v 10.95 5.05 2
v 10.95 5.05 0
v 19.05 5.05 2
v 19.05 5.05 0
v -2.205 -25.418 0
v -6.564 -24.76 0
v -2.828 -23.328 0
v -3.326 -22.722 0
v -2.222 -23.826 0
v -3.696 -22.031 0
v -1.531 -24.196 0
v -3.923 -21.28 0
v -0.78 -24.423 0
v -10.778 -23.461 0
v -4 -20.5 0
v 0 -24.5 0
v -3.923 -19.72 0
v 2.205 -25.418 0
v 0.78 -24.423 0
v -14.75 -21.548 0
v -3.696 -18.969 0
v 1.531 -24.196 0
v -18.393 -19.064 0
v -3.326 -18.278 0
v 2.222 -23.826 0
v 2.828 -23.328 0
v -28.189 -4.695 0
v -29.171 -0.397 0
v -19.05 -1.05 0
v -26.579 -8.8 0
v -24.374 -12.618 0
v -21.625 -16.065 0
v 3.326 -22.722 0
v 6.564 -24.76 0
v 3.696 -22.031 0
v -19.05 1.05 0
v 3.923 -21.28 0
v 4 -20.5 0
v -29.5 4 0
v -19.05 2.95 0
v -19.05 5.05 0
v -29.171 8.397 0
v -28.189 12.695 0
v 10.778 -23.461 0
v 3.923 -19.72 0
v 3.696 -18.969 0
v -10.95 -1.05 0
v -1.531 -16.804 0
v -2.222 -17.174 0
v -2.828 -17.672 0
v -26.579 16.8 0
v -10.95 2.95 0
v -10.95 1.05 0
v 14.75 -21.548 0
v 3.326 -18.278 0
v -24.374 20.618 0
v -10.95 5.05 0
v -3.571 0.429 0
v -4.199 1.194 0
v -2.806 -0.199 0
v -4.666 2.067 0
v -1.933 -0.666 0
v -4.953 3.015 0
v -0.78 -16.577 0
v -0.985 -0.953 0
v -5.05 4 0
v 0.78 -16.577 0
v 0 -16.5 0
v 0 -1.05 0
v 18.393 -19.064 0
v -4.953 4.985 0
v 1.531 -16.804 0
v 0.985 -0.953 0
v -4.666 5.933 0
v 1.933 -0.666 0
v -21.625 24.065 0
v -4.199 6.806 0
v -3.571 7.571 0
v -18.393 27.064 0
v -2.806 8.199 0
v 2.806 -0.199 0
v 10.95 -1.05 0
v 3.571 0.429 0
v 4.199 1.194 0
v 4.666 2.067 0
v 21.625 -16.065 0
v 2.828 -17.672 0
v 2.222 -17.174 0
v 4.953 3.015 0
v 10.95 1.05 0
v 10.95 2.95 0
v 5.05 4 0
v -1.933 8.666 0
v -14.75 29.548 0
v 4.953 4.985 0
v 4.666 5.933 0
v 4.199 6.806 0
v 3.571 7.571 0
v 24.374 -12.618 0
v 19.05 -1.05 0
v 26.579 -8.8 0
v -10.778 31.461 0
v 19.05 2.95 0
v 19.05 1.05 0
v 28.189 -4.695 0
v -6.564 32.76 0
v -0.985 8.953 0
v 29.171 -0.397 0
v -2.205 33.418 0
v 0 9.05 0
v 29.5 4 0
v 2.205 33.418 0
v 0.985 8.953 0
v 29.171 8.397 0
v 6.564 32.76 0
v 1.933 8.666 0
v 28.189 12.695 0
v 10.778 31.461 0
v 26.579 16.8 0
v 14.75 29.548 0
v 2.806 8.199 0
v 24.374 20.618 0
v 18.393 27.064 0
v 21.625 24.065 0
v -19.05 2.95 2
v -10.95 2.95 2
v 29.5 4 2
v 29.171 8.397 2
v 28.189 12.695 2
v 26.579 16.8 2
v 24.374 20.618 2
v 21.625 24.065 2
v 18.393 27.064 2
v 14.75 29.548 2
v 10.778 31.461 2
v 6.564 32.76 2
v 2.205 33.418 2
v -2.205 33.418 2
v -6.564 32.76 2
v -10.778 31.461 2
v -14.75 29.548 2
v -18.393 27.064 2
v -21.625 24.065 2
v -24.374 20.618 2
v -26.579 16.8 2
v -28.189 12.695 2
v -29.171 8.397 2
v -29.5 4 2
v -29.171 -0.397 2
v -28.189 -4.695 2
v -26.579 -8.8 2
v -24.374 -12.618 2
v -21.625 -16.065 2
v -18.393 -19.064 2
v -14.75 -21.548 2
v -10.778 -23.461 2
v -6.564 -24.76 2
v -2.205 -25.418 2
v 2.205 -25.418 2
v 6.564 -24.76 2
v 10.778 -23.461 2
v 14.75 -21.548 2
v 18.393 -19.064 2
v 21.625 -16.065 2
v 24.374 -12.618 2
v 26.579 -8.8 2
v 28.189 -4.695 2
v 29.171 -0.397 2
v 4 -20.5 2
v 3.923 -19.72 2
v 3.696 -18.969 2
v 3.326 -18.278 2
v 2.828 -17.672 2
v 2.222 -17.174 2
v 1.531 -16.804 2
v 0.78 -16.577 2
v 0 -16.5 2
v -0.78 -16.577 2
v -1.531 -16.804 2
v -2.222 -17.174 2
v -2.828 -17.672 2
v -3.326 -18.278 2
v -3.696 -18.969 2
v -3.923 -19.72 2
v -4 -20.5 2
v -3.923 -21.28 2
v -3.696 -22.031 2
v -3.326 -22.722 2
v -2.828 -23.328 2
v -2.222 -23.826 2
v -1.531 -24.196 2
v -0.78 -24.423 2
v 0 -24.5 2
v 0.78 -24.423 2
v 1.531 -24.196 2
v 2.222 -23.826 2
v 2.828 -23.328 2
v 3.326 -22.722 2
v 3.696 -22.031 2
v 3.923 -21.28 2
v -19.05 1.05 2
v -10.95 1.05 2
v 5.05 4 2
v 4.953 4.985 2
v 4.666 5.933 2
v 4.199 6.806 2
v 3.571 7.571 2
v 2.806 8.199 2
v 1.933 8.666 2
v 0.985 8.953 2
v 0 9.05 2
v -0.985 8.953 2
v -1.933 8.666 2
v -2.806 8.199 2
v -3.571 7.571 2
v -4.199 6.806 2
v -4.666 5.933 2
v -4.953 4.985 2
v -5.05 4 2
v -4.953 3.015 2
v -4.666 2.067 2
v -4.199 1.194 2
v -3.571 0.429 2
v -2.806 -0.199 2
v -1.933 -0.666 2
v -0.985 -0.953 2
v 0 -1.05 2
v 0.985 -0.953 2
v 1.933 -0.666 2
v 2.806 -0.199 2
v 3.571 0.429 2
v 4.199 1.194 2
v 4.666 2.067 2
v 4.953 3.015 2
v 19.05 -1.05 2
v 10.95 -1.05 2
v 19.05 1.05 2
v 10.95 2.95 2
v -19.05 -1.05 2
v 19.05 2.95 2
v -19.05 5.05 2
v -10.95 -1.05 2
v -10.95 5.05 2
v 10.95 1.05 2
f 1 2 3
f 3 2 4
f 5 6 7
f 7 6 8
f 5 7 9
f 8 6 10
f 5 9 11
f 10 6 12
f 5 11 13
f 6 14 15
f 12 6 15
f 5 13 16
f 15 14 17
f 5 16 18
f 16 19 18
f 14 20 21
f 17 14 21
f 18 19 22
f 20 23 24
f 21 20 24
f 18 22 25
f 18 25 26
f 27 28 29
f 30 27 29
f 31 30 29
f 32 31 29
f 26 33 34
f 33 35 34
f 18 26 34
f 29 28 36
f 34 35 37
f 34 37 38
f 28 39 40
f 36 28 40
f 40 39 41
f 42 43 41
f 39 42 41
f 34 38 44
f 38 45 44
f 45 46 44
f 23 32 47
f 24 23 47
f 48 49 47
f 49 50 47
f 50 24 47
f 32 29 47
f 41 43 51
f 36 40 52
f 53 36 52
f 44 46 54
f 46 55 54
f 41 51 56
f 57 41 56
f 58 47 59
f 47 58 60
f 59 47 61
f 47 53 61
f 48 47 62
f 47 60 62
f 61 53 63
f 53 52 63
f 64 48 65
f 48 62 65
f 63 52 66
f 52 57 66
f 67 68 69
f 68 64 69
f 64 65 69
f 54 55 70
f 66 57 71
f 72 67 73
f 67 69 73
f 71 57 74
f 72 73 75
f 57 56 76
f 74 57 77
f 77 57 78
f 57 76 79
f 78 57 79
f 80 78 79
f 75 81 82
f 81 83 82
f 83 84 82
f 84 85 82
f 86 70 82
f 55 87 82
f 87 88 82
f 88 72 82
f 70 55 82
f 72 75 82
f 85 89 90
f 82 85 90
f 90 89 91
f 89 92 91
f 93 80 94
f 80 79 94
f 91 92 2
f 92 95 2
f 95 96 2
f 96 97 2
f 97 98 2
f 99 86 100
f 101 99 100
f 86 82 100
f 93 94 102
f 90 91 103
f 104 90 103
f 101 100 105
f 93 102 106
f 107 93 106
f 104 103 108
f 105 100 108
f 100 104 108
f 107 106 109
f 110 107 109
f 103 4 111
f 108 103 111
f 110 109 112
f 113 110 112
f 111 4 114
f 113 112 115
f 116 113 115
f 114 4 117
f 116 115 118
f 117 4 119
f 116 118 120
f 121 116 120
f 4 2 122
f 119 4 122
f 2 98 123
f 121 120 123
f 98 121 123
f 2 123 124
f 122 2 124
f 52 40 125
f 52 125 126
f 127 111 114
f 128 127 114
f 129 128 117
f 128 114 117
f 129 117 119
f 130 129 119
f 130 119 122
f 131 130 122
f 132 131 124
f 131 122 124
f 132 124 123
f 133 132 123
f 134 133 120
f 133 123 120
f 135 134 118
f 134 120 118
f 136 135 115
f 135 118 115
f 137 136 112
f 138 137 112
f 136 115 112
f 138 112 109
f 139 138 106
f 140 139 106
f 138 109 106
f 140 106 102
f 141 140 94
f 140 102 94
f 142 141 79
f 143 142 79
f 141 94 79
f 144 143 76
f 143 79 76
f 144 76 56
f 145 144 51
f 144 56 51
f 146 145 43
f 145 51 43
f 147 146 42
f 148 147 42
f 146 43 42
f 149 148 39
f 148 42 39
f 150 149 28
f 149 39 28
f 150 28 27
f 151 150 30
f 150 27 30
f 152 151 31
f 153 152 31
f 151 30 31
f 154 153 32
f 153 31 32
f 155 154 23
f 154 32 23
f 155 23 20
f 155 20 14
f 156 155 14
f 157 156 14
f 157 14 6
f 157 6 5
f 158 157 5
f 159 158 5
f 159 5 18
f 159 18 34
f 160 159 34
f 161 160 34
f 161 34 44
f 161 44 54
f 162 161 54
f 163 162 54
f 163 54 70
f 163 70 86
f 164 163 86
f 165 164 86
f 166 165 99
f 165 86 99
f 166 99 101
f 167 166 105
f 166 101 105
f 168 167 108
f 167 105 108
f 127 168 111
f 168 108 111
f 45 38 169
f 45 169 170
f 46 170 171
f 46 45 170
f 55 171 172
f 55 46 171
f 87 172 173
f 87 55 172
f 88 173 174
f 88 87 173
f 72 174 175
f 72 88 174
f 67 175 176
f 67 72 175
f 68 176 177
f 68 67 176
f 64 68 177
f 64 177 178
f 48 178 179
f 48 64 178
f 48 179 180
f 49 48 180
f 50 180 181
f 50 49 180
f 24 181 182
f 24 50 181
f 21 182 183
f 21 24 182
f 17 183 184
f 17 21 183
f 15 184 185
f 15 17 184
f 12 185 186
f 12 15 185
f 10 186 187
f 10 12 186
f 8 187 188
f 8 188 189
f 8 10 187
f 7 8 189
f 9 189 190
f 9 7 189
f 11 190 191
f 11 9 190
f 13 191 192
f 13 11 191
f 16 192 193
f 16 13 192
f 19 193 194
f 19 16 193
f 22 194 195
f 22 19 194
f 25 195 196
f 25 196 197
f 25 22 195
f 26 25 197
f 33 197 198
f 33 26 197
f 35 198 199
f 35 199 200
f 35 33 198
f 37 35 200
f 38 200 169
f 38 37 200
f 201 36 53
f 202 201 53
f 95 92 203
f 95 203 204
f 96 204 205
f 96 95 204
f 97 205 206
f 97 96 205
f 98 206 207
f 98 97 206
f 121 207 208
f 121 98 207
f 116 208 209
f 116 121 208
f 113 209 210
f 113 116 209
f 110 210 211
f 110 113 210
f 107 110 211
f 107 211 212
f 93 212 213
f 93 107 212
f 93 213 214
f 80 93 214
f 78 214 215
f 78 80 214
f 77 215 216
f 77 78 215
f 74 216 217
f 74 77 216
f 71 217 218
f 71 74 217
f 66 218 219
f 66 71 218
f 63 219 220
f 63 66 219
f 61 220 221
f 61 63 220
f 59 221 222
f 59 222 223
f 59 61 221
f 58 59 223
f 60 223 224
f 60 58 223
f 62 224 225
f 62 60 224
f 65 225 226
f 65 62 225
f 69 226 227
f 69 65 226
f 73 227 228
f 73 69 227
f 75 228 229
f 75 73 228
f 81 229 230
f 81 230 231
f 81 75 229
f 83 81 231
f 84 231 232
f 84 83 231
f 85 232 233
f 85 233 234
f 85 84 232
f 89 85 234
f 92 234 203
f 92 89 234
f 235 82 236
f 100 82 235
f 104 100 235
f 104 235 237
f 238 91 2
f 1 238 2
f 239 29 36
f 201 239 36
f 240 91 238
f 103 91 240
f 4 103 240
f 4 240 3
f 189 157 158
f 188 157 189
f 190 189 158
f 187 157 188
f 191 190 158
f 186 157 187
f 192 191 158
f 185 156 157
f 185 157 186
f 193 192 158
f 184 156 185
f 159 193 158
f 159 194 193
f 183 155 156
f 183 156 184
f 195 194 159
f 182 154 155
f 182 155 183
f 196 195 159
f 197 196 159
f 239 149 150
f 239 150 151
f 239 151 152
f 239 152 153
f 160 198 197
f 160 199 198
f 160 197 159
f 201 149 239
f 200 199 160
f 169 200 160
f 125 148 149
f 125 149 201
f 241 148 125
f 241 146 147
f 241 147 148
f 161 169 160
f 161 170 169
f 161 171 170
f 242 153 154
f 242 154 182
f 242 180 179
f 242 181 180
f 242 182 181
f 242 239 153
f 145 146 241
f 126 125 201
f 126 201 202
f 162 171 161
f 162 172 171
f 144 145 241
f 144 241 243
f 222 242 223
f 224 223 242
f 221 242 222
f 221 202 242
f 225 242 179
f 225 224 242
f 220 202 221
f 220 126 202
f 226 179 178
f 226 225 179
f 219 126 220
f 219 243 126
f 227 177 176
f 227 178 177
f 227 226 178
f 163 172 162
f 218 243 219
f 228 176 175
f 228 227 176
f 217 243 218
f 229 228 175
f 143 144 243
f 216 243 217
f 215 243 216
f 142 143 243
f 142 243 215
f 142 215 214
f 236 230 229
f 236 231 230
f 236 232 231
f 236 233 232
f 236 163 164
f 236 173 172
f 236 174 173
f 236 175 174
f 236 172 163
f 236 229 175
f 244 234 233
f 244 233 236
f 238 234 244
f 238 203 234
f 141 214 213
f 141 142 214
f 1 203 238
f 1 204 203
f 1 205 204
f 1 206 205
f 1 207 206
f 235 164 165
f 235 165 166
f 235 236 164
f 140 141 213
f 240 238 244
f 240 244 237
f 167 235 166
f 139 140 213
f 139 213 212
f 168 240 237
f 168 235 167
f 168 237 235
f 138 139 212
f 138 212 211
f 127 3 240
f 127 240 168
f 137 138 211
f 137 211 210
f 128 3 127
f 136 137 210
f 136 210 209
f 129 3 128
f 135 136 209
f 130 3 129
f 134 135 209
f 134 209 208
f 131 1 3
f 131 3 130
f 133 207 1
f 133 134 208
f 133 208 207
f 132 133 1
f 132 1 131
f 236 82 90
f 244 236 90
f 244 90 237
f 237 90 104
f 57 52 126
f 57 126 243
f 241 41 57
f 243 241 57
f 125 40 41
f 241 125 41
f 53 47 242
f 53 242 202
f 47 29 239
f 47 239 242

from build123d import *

# Parameters (mm, degrees)
SKETCH_1_R      = 29.5
SKETCH_1_R_2    = 5.05
SKETCH_1_R_3    = 4
SKETCH_1_W      = 8.1
SKETCH_1_H      = 2.1
EXTRUDE_1_DEPTH = 2


with BuildPart() as part:
    # 草图1 → 凸台-拉伸1 (new body)
    with BuildSketch(Plane.XY):
        with Locations((0, 4)):
            Circle(SKETCH_1_R)
        with Locations((0, 4)):
            Circle(SKETCH_1_R_2, mode=Mode.SUBTRACT)
        with Locations((0, -20.5)):
            Circle(SKETCH_1_R_3, mode=Mode.SUBTRACT)
        with Locations((-15, 4)):
            Rectangle(SKETCH_1_W, SKETCH_1_H, mode=Mode.SUBTRACT)
        with Locations((-15, 0)):
            Rectangle(SKETCH_1_W, SKETCH_1_H, mode=Mode.SUBTRACT)
        with Locations((15, 4)):
            Rectangle(SKETCH_1_W, SKETCH_1_H, mode=Mode.SUBTRACT)
        with Locations((15, 0)):
            Rectangle(SKETCH_1_W, SKETCH_1_H, mode=Mode.SUBTRACT)
    extrude(amount=EXTRUDE_1_DEPTH)


solid = part.part
